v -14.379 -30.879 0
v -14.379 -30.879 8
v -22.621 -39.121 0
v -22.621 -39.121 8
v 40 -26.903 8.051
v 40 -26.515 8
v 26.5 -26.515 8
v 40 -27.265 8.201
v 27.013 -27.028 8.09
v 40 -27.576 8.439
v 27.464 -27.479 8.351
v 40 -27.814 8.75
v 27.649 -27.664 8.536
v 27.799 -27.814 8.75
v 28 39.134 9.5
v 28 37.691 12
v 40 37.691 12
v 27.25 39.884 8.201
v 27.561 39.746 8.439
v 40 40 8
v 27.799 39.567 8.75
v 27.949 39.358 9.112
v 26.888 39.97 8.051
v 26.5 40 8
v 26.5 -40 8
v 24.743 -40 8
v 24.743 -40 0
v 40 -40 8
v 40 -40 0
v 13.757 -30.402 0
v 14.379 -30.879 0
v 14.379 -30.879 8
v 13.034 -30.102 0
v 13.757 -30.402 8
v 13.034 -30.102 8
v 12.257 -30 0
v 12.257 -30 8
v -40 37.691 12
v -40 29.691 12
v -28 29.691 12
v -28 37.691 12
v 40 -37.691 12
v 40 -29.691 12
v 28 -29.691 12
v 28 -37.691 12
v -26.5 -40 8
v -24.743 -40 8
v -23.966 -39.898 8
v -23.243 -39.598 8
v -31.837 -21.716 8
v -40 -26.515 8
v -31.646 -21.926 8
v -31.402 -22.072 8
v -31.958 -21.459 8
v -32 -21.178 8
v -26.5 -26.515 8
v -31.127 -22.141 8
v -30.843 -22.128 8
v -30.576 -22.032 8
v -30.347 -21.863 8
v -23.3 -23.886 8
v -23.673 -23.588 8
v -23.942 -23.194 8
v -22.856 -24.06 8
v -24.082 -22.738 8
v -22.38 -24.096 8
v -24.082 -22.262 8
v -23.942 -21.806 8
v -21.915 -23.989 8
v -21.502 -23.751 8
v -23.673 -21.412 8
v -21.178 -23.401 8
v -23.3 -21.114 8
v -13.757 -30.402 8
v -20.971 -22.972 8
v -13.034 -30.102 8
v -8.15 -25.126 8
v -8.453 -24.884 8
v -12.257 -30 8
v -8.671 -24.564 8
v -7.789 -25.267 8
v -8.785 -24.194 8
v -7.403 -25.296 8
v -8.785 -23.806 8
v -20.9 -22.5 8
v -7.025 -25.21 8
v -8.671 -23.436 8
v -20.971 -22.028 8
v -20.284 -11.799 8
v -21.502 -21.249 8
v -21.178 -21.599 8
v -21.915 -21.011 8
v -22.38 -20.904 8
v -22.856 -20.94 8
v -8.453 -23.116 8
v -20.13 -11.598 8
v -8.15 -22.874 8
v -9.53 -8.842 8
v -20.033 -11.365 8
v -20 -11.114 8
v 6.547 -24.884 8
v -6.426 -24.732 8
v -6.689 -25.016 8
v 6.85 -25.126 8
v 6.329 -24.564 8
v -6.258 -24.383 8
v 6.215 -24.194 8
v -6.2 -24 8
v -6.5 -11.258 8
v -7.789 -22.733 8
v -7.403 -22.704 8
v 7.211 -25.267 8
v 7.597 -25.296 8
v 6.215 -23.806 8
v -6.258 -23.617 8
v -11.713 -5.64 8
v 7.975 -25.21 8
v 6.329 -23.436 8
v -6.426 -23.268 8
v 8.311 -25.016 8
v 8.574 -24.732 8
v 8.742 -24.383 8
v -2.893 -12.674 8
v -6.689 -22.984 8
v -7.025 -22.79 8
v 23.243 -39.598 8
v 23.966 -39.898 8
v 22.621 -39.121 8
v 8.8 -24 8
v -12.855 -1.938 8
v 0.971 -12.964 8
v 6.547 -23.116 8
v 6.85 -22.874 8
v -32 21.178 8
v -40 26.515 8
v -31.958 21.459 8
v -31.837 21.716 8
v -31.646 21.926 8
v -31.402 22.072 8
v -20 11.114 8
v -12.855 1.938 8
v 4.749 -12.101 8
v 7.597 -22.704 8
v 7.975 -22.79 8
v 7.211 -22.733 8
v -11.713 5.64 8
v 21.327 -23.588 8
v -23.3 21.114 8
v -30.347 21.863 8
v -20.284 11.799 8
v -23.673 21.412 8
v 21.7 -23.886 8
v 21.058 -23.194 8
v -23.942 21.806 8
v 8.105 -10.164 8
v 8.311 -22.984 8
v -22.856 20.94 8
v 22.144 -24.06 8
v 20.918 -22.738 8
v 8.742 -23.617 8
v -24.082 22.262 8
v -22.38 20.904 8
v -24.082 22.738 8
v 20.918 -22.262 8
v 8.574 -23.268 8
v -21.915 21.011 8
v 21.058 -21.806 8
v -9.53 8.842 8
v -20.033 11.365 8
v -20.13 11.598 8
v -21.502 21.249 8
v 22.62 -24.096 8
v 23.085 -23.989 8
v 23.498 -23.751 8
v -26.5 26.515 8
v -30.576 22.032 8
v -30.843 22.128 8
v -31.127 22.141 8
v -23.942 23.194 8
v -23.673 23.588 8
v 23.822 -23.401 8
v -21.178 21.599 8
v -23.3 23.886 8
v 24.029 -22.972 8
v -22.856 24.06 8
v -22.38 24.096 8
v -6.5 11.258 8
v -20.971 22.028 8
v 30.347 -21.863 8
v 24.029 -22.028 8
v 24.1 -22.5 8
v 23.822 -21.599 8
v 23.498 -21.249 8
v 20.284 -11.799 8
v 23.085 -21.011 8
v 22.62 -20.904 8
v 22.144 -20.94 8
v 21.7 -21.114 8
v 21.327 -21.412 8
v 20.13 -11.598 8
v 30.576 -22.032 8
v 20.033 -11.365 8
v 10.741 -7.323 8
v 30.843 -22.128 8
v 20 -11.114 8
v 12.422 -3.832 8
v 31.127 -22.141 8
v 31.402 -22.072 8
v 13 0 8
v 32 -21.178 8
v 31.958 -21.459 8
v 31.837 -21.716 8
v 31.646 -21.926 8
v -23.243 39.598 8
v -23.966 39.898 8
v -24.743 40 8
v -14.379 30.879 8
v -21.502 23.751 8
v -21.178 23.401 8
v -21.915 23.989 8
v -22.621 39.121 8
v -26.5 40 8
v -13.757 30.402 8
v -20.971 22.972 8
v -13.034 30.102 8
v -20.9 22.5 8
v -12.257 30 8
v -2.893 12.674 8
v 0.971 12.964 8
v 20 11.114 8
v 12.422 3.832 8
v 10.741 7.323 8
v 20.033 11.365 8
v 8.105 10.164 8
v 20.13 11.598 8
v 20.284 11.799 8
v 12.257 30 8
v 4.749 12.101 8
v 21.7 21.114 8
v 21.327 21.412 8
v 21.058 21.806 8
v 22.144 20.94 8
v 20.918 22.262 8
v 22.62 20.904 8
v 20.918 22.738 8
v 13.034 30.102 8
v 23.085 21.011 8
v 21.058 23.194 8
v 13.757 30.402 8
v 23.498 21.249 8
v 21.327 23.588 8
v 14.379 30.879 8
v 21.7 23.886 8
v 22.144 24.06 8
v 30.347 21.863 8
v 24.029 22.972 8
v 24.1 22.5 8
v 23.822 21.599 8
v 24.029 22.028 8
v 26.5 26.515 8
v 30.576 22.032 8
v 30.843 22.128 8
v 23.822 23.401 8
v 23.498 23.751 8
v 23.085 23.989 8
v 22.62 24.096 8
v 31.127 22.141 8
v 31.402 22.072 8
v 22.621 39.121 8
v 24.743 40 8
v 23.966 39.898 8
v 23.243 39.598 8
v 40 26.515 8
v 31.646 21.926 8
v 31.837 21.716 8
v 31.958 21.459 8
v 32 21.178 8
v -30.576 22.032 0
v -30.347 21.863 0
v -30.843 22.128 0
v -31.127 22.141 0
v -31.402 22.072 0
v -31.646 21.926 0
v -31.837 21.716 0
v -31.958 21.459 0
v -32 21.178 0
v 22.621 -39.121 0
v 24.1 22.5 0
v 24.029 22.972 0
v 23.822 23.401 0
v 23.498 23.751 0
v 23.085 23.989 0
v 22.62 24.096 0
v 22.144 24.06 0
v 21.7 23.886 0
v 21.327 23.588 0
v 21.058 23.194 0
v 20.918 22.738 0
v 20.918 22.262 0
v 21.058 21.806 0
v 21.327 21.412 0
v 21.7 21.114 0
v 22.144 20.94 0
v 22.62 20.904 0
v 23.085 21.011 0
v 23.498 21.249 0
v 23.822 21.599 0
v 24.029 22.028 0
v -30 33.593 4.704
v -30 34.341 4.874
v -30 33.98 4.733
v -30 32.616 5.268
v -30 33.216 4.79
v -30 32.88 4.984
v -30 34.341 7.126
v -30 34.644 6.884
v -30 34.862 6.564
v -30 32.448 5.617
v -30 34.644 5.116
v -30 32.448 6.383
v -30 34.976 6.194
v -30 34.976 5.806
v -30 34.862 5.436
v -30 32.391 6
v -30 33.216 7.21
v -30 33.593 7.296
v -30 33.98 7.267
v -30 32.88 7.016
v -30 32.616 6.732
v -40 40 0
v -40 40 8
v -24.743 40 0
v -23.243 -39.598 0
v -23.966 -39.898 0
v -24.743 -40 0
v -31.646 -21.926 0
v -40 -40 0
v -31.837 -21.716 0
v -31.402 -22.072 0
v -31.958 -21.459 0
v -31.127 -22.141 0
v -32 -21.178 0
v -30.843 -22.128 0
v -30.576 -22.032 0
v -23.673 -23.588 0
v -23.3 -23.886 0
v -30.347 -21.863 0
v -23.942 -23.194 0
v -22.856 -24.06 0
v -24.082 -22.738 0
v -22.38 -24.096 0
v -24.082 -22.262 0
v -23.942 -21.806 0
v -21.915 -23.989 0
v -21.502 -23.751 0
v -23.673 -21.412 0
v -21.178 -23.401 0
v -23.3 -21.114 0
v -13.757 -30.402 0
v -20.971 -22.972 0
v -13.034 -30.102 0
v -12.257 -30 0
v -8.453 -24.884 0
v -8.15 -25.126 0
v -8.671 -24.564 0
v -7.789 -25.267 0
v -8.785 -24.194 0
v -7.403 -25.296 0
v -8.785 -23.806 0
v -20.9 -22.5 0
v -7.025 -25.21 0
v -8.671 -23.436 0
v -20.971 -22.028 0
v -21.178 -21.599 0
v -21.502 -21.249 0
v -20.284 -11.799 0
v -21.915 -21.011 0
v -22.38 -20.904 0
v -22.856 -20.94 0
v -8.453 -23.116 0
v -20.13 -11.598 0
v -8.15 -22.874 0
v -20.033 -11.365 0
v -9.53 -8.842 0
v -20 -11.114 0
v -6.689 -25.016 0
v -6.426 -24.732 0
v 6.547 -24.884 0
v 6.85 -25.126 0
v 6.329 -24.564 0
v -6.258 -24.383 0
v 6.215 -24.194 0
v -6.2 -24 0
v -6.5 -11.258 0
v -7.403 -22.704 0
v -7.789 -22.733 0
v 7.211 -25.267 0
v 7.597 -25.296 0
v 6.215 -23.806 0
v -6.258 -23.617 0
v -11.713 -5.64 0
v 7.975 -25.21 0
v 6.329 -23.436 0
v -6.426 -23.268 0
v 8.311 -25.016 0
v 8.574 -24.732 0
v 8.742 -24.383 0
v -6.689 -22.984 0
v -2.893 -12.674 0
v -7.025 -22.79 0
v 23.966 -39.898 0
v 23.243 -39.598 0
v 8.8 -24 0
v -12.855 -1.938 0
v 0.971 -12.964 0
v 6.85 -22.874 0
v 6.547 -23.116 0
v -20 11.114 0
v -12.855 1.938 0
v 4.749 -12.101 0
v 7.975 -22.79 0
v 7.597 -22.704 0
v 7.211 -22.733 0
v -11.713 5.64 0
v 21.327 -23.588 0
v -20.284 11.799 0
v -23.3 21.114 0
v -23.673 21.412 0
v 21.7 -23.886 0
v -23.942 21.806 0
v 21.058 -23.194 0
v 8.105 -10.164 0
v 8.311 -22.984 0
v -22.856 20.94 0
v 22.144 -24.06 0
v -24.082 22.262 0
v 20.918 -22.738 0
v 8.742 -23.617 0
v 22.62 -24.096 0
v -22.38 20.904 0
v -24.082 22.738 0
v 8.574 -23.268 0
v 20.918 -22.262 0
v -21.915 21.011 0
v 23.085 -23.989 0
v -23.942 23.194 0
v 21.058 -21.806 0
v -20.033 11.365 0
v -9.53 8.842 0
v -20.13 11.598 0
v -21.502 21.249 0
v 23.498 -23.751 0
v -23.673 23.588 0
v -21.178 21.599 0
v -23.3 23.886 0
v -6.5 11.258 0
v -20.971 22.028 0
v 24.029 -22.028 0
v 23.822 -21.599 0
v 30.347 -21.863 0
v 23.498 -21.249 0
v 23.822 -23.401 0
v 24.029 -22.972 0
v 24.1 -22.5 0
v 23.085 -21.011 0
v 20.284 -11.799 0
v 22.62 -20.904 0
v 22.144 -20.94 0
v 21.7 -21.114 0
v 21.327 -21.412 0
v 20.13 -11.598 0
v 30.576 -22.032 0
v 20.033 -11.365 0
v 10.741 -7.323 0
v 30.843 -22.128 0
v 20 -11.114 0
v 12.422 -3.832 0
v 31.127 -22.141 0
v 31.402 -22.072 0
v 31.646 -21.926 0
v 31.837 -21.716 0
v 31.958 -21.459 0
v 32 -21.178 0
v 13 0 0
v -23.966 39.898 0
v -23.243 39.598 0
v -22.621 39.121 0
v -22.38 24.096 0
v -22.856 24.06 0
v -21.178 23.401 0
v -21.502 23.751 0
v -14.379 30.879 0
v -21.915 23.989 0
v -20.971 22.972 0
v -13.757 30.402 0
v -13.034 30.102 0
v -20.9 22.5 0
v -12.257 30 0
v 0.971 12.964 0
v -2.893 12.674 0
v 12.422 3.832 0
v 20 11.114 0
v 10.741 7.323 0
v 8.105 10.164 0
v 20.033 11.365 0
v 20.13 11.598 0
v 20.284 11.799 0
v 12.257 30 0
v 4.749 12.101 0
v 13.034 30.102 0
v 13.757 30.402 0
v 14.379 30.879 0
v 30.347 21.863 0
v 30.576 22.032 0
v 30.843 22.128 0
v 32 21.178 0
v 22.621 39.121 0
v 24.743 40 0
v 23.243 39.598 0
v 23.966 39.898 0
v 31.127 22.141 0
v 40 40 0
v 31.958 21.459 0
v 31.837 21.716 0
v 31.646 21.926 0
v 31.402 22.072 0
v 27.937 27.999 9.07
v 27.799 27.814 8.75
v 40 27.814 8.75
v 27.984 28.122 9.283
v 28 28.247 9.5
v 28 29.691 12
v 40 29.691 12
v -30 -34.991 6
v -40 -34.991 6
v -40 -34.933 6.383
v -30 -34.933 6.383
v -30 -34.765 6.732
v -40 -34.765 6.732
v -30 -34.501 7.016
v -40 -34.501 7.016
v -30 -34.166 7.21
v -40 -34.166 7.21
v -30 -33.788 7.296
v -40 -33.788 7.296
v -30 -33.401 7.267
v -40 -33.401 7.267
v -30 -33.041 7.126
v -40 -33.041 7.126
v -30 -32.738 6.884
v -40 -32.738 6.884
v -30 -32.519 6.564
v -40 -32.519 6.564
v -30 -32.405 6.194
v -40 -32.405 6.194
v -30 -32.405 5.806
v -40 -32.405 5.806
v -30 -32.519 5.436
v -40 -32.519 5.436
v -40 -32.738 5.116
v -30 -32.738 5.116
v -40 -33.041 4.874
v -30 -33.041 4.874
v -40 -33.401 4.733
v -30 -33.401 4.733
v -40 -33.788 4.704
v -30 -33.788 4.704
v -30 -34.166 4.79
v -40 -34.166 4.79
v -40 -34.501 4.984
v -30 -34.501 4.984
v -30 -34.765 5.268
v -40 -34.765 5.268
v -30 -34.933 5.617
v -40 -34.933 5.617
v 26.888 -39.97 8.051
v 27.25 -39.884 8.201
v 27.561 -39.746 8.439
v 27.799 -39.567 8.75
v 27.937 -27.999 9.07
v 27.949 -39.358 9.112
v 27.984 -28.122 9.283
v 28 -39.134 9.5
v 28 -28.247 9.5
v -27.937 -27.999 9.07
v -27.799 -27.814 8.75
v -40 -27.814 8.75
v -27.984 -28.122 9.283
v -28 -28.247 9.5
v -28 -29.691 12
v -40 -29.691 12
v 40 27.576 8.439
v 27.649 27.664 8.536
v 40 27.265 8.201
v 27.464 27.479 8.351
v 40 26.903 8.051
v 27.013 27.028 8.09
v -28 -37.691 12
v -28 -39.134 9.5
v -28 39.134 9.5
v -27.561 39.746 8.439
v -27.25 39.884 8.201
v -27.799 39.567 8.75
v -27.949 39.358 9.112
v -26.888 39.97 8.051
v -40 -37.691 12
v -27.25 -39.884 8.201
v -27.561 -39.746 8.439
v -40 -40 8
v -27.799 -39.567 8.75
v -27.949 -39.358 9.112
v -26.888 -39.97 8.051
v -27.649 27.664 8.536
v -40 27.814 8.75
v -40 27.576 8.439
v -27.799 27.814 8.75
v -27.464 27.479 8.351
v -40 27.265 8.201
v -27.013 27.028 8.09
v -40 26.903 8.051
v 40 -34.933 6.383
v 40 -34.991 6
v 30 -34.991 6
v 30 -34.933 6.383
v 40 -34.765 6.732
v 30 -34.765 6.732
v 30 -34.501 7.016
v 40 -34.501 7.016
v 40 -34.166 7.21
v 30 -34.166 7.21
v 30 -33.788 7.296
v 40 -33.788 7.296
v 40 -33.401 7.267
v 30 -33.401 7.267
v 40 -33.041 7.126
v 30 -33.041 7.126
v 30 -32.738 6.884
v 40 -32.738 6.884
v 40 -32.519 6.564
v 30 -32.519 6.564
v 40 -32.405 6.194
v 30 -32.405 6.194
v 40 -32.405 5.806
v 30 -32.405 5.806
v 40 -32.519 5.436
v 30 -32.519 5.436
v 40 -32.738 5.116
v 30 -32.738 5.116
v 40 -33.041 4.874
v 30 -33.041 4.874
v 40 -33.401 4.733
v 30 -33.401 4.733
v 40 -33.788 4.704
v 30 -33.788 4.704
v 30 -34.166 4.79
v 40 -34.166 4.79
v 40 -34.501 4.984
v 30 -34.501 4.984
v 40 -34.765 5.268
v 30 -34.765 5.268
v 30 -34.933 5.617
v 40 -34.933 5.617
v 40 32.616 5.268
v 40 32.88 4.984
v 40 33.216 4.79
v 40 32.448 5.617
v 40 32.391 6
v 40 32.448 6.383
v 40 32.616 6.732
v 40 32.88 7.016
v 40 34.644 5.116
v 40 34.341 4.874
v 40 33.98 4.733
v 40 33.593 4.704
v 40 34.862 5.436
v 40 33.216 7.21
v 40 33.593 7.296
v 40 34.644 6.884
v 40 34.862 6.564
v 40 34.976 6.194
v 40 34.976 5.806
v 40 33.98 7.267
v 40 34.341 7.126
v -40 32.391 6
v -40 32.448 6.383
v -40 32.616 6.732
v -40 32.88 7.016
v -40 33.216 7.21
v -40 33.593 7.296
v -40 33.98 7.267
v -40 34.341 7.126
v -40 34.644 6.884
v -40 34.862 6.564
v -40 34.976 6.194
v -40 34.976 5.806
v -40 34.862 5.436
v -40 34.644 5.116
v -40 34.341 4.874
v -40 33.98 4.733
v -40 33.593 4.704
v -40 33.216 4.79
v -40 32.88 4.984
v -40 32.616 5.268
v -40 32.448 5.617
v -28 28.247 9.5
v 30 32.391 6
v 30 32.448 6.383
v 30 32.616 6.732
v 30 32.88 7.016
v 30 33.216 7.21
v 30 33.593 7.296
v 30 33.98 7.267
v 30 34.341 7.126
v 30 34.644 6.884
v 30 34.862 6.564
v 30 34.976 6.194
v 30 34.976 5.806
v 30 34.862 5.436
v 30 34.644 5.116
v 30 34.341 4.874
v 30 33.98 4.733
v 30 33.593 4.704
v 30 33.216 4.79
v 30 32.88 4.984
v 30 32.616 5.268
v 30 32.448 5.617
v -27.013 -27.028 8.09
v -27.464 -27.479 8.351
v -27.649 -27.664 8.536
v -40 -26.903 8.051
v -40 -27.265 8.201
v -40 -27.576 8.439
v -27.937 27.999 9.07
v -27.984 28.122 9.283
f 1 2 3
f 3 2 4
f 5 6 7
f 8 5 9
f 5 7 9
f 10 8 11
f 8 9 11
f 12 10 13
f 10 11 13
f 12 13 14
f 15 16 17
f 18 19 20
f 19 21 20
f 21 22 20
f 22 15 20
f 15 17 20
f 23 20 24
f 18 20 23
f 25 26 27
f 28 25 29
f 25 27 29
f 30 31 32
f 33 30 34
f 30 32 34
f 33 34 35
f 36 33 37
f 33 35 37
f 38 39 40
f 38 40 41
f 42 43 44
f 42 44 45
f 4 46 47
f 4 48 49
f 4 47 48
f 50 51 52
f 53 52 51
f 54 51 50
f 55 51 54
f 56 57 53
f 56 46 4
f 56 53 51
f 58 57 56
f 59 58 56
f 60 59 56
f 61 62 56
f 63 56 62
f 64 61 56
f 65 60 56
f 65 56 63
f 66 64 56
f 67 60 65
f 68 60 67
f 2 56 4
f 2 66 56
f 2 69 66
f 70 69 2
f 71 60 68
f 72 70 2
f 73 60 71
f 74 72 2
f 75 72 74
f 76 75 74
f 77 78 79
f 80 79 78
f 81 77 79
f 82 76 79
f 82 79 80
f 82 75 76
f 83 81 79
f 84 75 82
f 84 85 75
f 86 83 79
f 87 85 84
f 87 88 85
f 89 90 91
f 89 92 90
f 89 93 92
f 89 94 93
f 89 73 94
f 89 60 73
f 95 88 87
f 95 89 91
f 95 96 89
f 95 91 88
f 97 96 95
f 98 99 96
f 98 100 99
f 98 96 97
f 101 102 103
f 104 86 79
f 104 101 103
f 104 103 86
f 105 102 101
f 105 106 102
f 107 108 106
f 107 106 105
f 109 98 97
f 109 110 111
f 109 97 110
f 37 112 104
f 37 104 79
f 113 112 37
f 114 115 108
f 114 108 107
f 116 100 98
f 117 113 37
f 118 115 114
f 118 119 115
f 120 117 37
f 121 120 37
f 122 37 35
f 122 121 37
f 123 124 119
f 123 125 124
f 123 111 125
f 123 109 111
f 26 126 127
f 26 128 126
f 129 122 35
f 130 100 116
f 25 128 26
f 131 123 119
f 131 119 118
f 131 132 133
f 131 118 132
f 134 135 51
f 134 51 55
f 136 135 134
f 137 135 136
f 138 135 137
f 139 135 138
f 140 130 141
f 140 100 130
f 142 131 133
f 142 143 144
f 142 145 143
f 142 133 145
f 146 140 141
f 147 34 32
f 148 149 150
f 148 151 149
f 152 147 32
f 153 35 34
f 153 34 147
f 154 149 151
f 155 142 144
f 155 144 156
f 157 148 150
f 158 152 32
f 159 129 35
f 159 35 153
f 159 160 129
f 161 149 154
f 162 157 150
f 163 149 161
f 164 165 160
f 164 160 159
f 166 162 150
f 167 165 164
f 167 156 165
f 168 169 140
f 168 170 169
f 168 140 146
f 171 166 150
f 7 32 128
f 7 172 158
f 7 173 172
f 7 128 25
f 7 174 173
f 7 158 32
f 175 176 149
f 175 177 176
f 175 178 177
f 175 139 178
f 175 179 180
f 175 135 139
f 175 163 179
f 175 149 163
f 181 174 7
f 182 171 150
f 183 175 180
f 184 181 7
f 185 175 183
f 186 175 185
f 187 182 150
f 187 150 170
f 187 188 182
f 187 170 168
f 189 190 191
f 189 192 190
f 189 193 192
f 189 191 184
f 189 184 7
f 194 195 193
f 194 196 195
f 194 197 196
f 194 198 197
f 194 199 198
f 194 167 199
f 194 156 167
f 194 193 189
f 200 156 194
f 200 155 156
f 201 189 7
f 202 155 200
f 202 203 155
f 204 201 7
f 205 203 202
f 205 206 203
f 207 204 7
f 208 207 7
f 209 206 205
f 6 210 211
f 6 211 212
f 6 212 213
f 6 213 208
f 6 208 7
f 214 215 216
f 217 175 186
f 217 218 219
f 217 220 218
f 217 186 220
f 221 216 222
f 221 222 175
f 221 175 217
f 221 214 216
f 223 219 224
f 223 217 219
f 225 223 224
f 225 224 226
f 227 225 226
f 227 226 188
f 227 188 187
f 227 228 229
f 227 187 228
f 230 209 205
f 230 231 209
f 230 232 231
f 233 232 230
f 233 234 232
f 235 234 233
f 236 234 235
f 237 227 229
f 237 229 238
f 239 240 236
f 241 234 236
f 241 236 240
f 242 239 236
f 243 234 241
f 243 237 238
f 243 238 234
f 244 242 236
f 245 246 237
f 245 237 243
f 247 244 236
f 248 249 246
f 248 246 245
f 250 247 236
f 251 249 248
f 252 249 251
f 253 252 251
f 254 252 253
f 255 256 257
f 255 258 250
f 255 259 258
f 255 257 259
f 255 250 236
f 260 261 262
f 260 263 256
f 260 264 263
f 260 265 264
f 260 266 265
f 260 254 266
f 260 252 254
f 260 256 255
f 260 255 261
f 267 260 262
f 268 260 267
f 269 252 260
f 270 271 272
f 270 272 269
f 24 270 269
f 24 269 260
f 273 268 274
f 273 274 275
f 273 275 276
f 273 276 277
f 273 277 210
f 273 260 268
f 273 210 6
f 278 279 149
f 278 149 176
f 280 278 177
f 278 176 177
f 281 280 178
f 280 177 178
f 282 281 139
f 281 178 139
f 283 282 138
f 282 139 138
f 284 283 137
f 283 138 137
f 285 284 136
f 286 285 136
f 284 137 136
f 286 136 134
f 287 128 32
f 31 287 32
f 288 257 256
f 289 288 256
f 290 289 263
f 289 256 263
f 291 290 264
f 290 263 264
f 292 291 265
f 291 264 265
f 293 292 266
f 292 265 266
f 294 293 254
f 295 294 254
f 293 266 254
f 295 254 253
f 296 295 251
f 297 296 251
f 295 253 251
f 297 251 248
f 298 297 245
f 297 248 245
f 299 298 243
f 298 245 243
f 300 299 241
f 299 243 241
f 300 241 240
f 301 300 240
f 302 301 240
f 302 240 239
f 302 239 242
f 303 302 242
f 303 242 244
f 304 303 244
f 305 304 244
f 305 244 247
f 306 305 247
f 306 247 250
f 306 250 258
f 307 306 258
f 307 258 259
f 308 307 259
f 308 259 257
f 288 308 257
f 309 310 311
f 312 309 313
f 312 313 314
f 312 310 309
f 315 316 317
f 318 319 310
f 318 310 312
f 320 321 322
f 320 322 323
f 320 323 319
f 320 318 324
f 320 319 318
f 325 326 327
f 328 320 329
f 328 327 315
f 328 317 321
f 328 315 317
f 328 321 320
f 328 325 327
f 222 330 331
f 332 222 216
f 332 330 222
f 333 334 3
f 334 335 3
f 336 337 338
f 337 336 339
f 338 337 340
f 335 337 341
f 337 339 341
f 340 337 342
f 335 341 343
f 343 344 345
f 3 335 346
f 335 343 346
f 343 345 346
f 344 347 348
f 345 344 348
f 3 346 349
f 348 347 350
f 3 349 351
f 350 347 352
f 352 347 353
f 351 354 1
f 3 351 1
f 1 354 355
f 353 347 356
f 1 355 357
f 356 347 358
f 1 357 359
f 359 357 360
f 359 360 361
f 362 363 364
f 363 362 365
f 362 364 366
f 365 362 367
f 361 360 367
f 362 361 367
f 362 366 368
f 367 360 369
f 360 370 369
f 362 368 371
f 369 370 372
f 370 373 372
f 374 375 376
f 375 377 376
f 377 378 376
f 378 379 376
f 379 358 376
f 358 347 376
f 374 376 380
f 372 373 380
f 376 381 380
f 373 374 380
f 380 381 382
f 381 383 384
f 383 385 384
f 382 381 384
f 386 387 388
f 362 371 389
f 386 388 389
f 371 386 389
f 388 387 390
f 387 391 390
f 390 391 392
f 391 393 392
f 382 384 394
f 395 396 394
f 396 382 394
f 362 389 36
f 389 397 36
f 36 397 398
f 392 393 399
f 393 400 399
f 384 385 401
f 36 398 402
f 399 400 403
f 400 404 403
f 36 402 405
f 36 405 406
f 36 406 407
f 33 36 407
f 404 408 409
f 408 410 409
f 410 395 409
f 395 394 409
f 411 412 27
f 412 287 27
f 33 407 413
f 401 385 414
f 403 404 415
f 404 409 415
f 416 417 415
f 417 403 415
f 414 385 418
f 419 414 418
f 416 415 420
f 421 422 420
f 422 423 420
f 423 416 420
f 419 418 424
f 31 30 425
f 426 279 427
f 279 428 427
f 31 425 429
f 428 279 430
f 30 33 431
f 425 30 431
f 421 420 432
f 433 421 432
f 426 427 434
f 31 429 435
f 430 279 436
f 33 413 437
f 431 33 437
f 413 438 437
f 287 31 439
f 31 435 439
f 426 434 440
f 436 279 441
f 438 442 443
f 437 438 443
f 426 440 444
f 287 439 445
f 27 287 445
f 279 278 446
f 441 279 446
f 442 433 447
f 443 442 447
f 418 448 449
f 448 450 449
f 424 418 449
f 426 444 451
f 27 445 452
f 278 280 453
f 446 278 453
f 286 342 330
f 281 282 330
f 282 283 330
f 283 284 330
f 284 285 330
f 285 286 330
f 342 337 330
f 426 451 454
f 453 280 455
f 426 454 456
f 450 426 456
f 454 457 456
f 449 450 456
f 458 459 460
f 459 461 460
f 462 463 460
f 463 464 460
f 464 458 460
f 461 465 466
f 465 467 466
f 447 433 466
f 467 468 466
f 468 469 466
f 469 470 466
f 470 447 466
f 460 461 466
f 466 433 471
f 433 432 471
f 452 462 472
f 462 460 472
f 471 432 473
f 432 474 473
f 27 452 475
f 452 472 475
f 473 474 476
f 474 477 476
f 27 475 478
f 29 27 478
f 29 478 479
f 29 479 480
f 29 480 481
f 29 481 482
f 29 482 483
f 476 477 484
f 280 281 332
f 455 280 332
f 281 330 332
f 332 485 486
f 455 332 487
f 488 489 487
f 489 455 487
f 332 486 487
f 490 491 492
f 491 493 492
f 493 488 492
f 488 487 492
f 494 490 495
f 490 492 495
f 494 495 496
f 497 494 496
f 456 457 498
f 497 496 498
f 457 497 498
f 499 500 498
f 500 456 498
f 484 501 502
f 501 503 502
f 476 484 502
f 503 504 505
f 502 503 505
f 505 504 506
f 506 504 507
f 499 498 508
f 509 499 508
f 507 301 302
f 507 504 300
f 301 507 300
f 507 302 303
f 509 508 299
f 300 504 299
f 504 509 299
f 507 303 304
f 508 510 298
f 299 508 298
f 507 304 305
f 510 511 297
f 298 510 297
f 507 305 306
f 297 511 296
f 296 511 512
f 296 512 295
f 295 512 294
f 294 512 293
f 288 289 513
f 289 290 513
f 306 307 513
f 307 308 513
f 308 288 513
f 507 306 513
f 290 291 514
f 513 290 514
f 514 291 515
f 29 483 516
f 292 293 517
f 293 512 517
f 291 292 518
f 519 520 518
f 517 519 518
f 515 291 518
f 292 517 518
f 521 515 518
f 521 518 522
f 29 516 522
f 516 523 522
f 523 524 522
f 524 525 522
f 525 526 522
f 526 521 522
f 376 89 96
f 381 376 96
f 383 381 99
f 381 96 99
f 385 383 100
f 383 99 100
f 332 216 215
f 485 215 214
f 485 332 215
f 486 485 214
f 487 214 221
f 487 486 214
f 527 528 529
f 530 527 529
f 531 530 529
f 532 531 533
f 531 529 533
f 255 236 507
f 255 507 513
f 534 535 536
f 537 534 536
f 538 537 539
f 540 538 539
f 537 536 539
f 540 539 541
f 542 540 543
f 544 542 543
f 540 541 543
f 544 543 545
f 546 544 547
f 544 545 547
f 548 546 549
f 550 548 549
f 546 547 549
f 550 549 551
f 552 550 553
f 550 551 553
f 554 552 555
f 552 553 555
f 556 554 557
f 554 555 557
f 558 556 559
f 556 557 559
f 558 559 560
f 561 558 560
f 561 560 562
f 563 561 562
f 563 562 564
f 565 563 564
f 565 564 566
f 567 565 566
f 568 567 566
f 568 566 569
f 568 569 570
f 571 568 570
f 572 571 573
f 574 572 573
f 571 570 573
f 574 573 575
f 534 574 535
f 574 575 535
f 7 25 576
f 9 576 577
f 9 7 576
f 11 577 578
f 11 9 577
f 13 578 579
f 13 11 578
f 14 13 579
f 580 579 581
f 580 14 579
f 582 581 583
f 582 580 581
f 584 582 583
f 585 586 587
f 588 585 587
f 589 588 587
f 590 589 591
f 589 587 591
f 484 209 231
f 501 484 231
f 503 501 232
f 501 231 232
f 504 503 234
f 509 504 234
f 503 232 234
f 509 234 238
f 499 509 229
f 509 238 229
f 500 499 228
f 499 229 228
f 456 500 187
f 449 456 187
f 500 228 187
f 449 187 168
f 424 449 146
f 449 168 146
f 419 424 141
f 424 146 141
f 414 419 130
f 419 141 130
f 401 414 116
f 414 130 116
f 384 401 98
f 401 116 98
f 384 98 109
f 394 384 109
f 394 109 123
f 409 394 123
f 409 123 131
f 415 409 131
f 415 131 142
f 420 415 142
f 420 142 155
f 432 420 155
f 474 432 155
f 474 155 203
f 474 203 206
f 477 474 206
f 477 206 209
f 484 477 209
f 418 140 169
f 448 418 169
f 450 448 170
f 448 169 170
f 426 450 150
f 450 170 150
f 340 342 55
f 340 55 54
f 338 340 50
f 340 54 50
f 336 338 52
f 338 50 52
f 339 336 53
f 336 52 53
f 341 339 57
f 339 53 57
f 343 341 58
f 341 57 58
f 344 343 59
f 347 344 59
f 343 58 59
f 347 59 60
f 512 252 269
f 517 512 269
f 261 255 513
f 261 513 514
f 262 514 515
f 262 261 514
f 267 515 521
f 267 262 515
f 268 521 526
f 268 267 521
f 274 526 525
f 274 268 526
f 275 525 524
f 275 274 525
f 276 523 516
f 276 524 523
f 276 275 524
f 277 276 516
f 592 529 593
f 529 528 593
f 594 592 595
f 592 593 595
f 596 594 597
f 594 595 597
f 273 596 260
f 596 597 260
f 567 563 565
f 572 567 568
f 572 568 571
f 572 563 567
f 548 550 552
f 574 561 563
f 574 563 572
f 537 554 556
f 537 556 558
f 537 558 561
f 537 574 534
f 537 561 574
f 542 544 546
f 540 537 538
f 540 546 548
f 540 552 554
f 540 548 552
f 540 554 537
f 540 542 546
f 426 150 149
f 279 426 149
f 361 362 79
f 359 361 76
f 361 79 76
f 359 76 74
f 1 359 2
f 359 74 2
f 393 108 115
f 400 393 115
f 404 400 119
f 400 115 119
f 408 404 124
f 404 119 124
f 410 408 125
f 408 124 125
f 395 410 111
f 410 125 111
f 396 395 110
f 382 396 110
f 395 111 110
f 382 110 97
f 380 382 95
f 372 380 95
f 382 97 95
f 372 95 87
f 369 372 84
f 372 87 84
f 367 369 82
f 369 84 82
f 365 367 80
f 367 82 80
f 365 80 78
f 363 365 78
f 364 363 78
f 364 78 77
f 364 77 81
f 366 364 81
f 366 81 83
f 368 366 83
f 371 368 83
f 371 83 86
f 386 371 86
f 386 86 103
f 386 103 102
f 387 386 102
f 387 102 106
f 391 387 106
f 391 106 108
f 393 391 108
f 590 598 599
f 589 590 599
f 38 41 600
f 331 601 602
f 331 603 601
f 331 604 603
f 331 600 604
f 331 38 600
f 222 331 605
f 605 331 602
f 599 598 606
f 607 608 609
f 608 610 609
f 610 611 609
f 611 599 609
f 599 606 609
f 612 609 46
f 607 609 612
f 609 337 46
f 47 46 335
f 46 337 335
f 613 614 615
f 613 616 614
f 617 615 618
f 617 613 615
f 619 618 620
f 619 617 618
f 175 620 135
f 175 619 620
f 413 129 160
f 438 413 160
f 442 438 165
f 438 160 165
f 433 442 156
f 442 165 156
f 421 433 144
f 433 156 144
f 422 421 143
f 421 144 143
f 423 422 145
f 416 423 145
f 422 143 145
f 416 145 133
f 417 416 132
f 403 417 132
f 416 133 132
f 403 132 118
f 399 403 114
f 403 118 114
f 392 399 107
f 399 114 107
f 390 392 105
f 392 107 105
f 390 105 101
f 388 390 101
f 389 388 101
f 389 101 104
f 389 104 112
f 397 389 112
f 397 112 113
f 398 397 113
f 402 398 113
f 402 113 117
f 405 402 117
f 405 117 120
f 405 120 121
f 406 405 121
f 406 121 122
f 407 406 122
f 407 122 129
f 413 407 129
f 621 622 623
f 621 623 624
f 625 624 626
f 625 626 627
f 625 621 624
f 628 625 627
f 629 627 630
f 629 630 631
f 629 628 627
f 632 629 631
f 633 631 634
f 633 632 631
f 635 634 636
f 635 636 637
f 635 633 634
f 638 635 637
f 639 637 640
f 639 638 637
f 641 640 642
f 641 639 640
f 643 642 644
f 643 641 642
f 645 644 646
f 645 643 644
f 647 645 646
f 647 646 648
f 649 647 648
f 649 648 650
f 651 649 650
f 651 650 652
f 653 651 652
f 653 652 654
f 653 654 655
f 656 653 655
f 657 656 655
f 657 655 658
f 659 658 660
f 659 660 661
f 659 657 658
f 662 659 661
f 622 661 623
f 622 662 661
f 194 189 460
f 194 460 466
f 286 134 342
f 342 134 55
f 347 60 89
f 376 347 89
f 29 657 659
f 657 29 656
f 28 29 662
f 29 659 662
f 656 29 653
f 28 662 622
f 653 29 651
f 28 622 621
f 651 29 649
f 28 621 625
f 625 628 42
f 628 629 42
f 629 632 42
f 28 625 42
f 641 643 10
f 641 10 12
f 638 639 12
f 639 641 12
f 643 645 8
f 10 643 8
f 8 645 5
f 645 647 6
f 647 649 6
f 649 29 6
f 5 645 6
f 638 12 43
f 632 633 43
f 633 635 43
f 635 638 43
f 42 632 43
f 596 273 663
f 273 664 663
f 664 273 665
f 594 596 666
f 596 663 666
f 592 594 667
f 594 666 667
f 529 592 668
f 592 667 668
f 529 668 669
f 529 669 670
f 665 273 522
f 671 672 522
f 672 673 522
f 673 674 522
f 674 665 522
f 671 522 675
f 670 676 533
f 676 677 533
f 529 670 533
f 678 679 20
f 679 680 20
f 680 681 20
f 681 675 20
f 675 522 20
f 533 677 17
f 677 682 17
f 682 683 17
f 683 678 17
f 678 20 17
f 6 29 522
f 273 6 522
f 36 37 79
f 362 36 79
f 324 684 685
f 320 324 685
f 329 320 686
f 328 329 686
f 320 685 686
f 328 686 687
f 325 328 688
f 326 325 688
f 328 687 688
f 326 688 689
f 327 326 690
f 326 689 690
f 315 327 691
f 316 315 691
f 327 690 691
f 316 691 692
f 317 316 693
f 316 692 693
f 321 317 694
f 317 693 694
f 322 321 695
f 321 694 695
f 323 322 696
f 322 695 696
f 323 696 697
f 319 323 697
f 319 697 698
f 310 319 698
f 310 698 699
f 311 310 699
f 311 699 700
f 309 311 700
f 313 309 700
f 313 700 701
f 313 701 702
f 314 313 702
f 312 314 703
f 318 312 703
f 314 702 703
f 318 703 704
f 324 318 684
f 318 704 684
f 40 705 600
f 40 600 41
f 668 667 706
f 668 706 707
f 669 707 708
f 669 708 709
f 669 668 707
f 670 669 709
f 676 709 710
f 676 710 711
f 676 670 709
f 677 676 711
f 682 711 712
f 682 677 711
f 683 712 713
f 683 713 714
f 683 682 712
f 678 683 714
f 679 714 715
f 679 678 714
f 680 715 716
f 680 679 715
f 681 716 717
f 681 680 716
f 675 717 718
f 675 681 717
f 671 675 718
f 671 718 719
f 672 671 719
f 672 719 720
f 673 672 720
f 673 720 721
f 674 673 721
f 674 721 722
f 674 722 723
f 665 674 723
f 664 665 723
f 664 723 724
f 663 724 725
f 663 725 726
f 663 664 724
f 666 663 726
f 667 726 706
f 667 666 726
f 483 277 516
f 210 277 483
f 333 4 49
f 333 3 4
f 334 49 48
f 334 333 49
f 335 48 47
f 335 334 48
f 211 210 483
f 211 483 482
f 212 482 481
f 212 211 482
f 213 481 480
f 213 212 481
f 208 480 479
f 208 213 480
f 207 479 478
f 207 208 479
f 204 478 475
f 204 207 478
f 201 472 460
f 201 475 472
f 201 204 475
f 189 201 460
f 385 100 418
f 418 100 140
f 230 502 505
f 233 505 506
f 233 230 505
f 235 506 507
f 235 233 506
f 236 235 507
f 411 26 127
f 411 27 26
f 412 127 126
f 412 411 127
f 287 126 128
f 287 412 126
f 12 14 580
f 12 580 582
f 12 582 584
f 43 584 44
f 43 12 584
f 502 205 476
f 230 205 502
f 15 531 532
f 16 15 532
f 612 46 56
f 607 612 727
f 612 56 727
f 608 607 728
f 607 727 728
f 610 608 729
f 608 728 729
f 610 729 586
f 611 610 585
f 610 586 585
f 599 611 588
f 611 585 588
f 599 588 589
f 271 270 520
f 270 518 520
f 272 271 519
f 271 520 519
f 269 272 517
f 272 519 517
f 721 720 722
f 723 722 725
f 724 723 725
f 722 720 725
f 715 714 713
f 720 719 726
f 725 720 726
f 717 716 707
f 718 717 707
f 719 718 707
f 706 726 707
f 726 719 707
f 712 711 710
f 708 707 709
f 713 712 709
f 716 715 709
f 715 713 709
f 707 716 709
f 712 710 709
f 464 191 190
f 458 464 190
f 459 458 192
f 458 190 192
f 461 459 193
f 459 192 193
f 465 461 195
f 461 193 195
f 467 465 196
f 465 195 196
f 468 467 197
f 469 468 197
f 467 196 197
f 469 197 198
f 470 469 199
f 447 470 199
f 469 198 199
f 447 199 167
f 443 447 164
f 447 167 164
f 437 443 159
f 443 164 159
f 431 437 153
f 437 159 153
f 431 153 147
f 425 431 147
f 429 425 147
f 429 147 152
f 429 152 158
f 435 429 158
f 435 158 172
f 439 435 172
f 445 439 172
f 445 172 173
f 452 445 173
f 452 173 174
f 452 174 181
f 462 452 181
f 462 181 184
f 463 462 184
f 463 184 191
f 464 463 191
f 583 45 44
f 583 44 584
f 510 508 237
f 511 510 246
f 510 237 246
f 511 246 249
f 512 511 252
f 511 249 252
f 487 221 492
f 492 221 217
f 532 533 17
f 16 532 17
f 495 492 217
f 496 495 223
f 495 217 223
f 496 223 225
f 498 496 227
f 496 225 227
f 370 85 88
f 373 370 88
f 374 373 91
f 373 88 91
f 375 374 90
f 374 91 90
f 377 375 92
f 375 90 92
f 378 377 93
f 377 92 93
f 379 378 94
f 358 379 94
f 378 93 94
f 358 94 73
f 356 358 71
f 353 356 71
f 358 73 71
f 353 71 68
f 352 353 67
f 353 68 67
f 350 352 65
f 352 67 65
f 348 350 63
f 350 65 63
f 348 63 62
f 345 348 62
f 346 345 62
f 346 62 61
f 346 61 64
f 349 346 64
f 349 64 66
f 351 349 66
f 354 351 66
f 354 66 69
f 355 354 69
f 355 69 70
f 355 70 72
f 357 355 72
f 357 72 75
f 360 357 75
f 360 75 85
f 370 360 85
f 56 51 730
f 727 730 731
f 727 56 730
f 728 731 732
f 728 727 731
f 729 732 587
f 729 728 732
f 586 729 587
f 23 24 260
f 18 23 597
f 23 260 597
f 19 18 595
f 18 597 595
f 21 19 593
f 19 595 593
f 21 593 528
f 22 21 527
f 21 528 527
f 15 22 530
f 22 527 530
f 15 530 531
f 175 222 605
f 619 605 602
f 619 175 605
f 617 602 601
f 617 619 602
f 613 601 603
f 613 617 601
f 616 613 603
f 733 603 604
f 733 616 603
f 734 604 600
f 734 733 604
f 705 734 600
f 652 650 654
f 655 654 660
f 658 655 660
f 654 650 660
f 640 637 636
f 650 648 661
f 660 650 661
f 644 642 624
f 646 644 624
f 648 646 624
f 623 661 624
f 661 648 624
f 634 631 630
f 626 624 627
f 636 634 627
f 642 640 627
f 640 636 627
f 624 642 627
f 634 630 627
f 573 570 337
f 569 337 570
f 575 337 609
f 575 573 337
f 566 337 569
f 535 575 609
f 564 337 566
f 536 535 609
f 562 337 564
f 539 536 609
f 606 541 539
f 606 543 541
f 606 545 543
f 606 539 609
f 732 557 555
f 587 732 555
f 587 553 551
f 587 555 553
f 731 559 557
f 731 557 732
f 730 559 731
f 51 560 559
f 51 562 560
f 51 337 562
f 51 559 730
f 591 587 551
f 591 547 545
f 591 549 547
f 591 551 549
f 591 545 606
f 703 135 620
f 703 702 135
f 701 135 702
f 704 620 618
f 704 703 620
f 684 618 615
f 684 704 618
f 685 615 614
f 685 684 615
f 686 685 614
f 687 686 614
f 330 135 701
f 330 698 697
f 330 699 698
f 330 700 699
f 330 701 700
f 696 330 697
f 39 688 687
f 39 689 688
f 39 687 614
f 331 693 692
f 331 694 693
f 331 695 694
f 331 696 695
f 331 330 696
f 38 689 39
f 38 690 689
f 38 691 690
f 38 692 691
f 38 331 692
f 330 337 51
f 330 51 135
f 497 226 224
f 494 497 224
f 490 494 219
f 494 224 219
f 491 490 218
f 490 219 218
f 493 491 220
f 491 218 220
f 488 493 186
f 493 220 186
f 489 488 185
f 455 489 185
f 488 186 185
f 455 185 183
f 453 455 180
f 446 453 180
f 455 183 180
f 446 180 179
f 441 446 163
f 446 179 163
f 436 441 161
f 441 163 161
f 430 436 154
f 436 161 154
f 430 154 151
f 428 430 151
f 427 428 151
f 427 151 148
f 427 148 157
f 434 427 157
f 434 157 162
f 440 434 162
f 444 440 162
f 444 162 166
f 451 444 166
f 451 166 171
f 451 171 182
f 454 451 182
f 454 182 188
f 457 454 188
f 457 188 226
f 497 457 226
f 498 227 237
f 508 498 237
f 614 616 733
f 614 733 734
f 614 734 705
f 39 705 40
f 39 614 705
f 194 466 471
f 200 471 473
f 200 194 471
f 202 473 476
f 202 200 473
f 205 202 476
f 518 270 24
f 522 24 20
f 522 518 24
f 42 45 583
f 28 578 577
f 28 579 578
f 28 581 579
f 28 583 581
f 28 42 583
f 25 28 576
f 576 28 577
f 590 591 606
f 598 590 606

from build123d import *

# Parameters (mm, degrees)
SKETCH_1_W             = 80
SKETCH_1_H             = 80
EXTRUDE_1_DEPTH        = 8
SKETCH_6_R             = 13
CUT_EXTRUDE_3_DEPTH    = 50
EXTRUDE_2_DEPTH        = 12
FILLET_1_R             = 1.5
FILLET_1_OF_MIRROR_1_R = 1.5
SKETCH_8_R             = 1.3
CUT_EXTRUDE_4_DEPTH    = 10
SKETCH_9_R             = 1.3
CUT_EXTRUDE_5_DEPTH    = 10
SKETCH_10_R            = 1.6
CUT_EXTRUDE_6_DEPTH    = 10
CUT_EXTRUDE_7_DEPTH    = 10
FILLET_2_R             = 3


with BuildPart() as part:
    # 草图1 → 凸台-拉伸1 (new body)
    with BuildSketch(Plane.XY):
        Rectangle(SKETCH_1_W, SKETCH_1_H)
    extrude(amount=EXTRUDE_1_DEPTH)

    # 草图6 → 切除-拉伸3 (cut)
    with BuildSketch(Plane.XY.offset(8)):
        Circle(SKETCH_6_R)
    extrude(amount=-CUT_EXTRUDE_3_DEPTH, mode=Mode.SUBTRACT)

    # 草图7 → 凸台-拉伸2 (add)
    with BuildSketch(Plane.ZY.offset(40)):
        Polygon((8, 40), (8, 27.381197846), (12, 29.690598923), (12, 37.690598923), align=None)
        Polygon((12, -37.690598923), (8, -40), (8, -27.381197846), (12, -29.690598923), align=None)
    extrude_2 = extrude(amount=-EXTRUDE_2_DEPTH)

    # 圆角1
    fillet_1_edges = [part.edges().sort_by_distance(p)[0] for p in [
        (-28, 33.690598923, 8),
        (-34, 27.381197846, 8),
        (-28, -33.690598923, 8),
        (-34, -27.381197846, 8),
    ]]
    fillet(fillet_1_edges, radius=FILLET_1_R)

    # 镜向1: 凸台-拉伸2 across plane
    add(extrude_2.mirror(Plane(origin=(0, 0, 0), x_dir=(0, 0, 1), z_dir=(1, 0, 0))))

    # 圆角1 of 镜向1
    fillet_1_of_mirror_1_edges = [part.edges().sort_by_distance(p)[0] for p in [
        (28, 33.690598923, 8),
        (34, 27.381197846, 8),
        (28, -33.690598923, 8),
        (34, -27.381197846, 8),
    ]]
    fillet(fillet_1_of_mirror_1_edges, radius=FILLET_1_OF_MIRROR_1_R)

    # 草图8 → 切除-拉伸4 (cut)
    with BuildSketch(Plane.ZY.offset(40)):
        with Locations(Location((6, 33.690598923, 0), (0, 0, 270))):
            Circle(SKETCH_8_R)
        with Locations(Location((6, -33.690598923, 0), (0, 0, 270))):
            Circle(SKETCH_8_R)
    cut_extrude_4 = extrude(amount=-CUT_EXTRUDE_4_DEPTH, mode=Mode.SUBTRACT)

    # 镜向2: 切除-拉伸4 across plane
    add(cut_extrude_4.mirror(Plane(origin=(0, 0, 0), x_dir=(0, 0, 1), z_dir=(1, 0, 0))), mode=Mode.SUBTRACT)

    # 草图9 → 切除-拉伸5 (cut)
    with BuildSketch(Plane.XY.offset(8)):
        with Locations((7.5, -24)):
            Circle(SKETCH_9_R)
        with Locations((-7.5, -24)):
            Circle(SKETCH_9_R)
    extrude(amount=-CUT_EXTRUDE_5_DEPTH, mode=Mode.SUBTRACT)

    # 草图10 → 切除-拉伸6 (cut)
    with BuildSketch(Plane.XY.offset(8)):
        with Locations((22.5, -22.5)):
            Circle(SKETCH_10_R)
        with Locations((-22.5, -22.5)):
            Circle(SKETCH_10_R)
        with Locations((22.5, 22.5)):
            Circle(SKETCH_10_R)
        with Locations((-22.5, 22.5)):
            Circle(SKETCH_10_R)
    extrude(amount=-CUT_EXTRUDE_6_DEPTH, mode=Mode.SUBTRACT)

    # 草图11 → 切除-拉伸7 (cut)
    with BuildSketch(Plane.XY.offset(8)):
        with BuildLine():
            Line((-23.5, 40), (-14.378679656, 30.878679656))
            ThreePointArc((-14.378679656, 30.878679656), (-13.40540961, 30.228361402), (-12.257359313, 30))
            Line((-12.257359313, 30), (12.257359313, 30))
            ThreePointArc((12.257359313, 30), (13.40540961, 30.228361402), (14.378679656, 30.878679656))
            Line((14.378679656, 30.878679656), (23.5, 40))
            Line((23.5, 40), (-23.5, 40))
        make_face()
        with BuildLine():
            Line((-32, 21.178048171), (-32, -21.178048171))
            ThreePointArc((-32, -21.178048171), (-31.402395233, -22.072426909), (-30.347403579, -21.862576022))
            Line((-30.347403579, -21.862576022), (-20.28354072, -11.798713162))
            ThreePointArc((-20.28354072, -11.798713162), (-20.073689832, -11.484649115), (-20, -11.114185312))
            Line((-20, -11.114185312), (-20, 11.114185312))
            ThreePointArc((-20, 11.114185312), (-20.073689832, 11.484649115), (-20.28354072, 11.798713162))
            Line((-20.28354072, 11.798713162), (-30.347403579, 21.862576022))
            ThreePointArc((-30.347403579, 21.862576022), (-31.402395233, 22.072426909), (-32, 21.178048171))
        make_face()
        with BuildLine():
            Line((-23.5, -40), (23.5, -40))
            Line((23.5, -40), (14.378679656, -30.878679656))
            ThreePointArc((14.378679656, -30.878679656), (13.40540961, -30.228361402), (12.257359313, -30))
            Line((12.257359313, -30), (-12.257359313, -30))
            ThreePointArc((-12.257359313, -30), (-13.40540961, -30.228361402), (-14.378679656, -30.878679656))
            Line((-14.378679656, -30.878679656), (-23.5, -40))
        make_face()
        with BuildLine():
            Line((20.28354072, 11.798713162), (30.347403579, 21.862576022))
            ThreePointArc((30.347403579, 21.862576022), (31.402395233, 22.072426909), (32, 21.178048171))
            Line((32, 21.178048171), (32, -21.178048171))
            ThreePointArc((32, -21.178048171), (31.402395233, -22.072426909), (30.347403579, -21.862576022))
            Line((30.347403579, -21.862576022), (20.28354072, -11.798713162))
            ThreePointArc((20.28354072, -11.798713162), (20.073689832, -11.484649115), (20, -11.114185312))
            Line((20, -11.114185312), (20, 11.114185312))
            ThreePointArc((20, 11.114185312), (20.073689832, 11.484649115), (20.28354072, 11.798713162))
        make_face()
    extrude(amount=-CUT_EXTRUDE_7_DEPTH, mode=Mode.SUBTRACT)

    # 圆角2
    fillet_2_edges = [part.edges().sort_by_distance(p)[0] for p in [
        (-23.5, 40, 4),
        (23.5, 40, 4),
        (-23.5, -40, 4),
        (23.5, -40, 4),
    ]]
    fillet(fillet_2_edges, radius=FILLET_2_R)


solid = part.part
